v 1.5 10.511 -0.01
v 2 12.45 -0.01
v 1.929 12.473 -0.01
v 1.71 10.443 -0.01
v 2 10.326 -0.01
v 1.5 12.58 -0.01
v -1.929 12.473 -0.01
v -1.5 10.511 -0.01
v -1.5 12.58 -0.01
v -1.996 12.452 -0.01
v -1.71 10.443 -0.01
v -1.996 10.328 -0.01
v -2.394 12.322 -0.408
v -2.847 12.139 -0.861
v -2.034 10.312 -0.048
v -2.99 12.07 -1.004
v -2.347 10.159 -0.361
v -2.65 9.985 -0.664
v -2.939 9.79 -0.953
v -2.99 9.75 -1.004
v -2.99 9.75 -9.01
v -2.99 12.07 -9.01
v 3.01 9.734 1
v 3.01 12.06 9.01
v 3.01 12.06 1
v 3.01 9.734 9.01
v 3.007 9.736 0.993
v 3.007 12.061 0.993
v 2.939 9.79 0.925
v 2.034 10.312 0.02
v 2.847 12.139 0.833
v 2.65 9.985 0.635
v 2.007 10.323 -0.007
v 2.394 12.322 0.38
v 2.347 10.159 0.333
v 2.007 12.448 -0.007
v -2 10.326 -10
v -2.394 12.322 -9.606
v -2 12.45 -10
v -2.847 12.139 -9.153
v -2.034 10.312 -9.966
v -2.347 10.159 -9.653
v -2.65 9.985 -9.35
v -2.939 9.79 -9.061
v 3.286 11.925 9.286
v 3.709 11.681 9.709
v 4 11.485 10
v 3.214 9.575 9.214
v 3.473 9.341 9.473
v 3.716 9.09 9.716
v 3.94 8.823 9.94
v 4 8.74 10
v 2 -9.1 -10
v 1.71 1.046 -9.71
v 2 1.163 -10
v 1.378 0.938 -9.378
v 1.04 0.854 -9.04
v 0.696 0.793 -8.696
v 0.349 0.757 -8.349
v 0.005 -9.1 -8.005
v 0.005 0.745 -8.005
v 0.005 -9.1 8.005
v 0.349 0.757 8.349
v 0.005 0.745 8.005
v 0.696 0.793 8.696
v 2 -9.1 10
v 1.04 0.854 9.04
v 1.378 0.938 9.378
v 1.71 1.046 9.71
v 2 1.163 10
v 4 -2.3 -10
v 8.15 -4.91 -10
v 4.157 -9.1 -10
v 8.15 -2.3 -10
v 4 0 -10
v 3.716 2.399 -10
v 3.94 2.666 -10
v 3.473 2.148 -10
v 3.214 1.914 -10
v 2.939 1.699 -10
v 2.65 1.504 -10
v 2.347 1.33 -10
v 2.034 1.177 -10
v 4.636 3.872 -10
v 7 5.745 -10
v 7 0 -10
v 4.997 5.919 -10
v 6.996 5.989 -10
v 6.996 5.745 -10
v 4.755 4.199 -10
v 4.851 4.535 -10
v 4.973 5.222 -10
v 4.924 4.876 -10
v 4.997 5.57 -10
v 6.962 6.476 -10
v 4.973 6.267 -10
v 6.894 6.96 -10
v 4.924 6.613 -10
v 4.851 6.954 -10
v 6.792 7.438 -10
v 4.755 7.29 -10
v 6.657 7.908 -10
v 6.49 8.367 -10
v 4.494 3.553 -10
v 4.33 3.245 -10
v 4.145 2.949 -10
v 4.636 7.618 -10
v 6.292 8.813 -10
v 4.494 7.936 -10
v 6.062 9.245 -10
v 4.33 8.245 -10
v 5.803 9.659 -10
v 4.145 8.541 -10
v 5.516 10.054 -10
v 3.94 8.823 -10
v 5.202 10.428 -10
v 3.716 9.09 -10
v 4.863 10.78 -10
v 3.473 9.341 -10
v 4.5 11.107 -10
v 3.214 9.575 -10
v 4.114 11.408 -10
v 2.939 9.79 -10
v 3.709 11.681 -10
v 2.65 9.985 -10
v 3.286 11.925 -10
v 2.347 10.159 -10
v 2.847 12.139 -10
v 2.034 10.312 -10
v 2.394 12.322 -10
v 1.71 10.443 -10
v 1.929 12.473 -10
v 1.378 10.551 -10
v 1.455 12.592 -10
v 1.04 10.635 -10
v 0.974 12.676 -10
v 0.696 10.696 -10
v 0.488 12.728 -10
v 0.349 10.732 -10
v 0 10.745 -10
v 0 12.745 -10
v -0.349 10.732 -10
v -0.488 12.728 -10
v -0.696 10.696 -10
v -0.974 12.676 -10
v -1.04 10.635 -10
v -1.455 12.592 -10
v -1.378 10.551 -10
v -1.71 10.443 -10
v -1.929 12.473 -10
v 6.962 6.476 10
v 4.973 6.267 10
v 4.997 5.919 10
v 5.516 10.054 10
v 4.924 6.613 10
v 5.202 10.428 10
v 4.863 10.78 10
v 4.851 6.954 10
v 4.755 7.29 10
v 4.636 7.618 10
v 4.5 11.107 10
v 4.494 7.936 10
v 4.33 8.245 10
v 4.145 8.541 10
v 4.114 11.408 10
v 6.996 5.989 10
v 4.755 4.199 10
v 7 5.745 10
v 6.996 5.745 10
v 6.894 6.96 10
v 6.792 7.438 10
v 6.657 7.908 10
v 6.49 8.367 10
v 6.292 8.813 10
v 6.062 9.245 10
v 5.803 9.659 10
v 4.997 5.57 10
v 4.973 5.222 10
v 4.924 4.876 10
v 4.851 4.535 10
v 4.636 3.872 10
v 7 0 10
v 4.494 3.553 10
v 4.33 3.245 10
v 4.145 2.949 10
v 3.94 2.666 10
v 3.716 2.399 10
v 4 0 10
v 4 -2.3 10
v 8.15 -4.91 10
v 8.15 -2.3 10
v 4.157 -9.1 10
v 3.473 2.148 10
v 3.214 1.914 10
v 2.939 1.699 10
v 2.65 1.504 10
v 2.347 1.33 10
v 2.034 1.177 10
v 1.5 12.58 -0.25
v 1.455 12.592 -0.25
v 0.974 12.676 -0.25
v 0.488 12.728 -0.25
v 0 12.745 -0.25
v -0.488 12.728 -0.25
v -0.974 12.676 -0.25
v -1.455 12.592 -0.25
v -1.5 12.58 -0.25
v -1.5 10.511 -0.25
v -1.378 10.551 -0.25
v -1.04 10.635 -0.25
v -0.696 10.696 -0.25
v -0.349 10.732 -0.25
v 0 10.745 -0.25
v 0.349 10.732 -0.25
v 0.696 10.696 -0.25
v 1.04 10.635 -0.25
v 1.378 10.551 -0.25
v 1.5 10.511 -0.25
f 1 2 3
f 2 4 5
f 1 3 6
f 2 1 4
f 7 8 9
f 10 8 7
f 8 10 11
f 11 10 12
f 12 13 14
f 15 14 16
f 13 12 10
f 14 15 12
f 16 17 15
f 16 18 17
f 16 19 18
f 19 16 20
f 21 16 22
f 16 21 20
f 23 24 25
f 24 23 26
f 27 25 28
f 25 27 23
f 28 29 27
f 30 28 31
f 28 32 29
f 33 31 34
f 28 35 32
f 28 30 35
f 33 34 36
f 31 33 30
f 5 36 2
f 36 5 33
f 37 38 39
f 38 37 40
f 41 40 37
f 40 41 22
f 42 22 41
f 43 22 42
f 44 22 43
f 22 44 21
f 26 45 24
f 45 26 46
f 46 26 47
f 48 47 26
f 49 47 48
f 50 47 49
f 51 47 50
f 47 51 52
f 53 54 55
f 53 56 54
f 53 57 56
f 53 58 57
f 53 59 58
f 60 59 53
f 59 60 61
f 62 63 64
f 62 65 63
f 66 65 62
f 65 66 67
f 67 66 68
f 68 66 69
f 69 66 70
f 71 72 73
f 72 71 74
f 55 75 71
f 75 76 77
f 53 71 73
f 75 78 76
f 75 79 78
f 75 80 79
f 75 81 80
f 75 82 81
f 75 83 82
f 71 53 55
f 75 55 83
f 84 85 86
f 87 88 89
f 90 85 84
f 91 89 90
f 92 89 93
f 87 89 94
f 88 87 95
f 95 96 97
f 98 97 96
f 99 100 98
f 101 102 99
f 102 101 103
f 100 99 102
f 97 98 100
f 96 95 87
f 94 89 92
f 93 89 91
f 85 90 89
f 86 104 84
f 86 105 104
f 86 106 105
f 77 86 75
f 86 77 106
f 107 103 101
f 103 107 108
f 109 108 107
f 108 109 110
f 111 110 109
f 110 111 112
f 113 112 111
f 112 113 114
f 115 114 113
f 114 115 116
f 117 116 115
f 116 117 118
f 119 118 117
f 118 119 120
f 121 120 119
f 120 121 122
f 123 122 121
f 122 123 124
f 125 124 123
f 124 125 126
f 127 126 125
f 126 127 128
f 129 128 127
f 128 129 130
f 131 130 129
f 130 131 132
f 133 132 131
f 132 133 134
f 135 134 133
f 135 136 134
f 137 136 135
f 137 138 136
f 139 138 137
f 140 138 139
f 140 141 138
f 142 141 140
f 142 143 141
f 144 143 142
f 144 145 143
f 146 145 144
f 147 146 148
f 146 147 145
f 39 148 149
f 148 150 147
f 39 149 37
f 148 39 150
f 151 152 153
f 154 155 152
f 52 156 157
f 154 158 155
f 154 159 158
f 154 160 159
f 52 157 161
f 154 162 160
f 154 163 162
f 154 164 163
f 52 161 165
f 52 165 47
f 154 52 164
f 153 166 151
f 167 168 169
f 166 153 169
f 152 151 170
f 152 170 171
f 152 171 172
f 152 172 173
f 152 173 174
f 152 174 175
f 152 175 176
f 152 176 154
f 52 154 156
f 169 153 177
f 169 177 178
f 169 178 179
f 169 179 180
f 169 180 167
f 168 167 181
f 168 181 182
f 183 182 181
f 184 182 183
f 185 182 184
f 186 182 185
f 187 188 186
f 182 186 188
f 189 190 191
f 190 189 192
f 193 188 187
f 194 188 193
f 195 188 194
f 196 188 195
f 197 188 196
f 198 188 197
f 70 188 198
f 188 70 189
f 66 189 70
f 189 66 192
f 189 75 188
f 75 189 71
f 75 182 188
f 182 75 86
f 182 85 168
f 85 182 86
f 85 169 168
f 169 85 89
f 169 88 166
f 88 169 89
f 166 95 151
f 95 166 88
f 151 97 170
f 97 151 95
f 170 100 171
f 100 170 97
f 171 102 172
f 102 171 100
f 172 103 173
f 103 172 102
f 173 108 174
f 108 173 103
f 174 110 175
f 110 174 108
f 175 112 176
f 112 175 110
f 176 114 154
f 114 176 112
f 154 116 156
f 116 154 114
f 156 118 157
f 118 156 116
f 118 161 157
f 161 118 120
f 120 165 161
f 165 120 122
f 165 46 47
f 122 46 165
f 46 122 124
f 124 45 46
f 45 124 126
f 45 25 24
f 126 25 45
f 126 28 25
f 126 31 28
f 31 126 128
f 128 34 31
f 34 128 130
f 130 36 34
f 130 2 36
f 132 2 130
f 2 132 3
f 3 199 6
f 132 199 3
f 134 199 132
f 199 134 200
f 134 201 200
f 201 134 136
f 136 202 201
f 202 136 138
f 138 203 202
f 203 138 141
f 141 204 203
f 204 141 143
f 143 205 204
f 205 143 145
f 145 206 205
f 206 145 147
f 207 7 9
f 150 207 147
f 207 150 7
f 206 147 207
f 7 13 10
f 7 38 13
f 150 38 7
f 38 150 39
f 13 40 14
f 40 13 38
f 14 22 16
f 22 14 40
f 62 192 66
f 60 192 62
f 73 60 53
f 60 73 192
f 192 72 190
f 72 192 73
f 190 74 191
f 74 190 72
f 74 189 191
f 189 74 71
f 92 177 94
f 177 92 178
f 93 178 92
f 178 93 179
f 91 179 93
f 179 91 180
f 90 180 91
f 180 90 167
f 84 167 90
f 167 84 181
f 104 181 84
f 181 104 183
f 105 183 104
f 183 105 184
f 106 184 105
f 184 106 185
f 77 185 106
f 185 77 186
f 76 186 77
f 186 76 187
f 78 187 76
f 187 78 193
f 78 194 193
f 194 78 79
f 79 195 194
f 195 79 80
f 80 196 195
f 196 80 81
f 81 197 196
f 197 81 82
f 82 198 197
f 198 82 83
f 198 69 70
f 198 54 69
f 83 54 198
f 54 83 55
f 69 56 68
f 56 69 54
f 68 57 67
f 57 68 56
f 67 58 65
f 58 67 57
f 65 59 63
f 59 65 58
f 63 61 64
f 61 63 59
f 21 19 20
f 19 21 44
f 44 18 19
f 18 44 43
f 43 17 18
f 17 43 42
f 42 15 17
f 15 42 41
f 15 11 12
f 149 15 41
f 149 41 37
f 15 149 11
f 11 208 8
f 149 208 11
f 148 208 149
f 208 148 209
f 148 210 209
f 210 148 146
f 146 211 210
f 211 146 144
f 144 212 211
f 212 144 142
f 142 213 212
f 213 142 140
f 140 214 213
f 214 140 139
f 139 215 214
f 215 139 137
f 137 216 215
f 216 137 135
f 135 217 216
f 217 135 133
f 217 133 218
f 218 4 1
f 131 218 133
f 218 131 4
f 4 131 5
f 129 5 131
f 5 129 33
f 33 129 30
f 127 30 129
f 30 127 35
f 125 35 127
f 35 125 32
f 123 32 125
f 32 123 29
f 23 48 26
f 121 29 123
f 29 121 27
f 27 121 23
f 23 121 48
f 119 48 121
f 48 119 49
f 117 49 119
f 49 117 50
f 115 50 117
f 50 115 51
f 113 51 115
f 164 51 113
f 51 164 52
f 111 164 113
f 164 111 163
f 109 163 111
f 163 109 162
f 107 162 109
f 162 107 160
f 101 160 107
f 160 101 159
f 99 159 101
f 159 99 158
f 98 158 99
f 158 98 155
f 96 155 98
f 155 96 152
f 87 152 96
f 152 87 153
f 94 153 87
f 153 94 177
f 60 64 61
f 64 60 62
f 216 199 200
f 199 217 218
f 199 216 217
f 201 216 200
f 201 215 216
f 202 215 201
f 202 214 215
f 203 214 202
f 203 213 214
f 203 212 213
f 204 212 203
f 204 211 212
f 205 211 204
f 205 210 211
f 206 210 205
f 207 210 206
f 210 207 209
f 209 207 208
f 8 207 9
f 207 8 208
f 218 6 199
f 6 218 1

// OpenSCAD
// System30 T-Slot Cable Holder
// v1, 26/3/2019
// by inks007
// This work is licensed under a Creative Commons Attribution-NonCommercial-ShareAlike 4.0 International License
// (CC BY-NC-SA 4.0)

// Cable holder length
holder_ln = 20;
// Cable holder inner diameter (range = 5-36)
holder_id = 10; // [5:36]
// Cable holder thickness (range = 2-4)
holder_th = 2; // [2:0.25:4]
// Loosen fit (range = 0-0.3)
loosen = 0.1; // [0:0.05:0.31]

/* [Hidden] */
holder_hln = holder_ln/2;
holder_ir = holder_id/2;
holder_od = holder_id+holder_th*2;
holder_or = holder_ir+holder_th;
holder_os = sqrt(pow(holder_ir+holder_th,2)-16)-holder_ir;
cut_os = 0.6*holder_ir;
cut_points = [[0,0],[0,cut_os-1],[1,cut_os],[holder_hln+0.1,cut_os]];

rotate([-90,90,0]) holder();

module holder() {
	difference() {
		rotate([0,-90,0]) linear_extrude(holder_ln,convexity=3,center=true) difference() {
			union() {
				offset(delta=-loosen) flange_profile();
				intersection() {
					translate([holder_ir+holder_os,0]) circle(d=holder_od,$fn=90);
					translate([holder_id+holder_os,0]) square(holder_od+2,center=true);
				}
				translate([holder_ir/2+holder_os/2,0]) square([holder_ir+holder_os,holder_od],center=true);
			}
			translate([holder_ir+holder_os,0]) circle(d=holder_id,$fn=90);
		}
		// Base cut
		translate([0,0,-10]) linear_extrude(10.1+holder_os+holder_ir,convexity=2) square([holder_ln+2,0.01],center=true);
		// Z cut
		rotate_duplicate([0,0,1]) translate([0,0,holder_os+holder_ir]) linear_extrude(holder_or+1,convexity=2) for (p=[0:1:len(cut_points)-2]) hull() {
			translate(cut_points[p]) circle(r=0.01,$fn=8);
			translate(cut_points[p+1]) circle(r=0.01,$fn=8);
		}
		// Screwdriver slot
		translate([0,0,holder_os+holder_ir+holder_or/2+0.5]) cube([0.5,cut_os*2-3,holder_or+1],center=true);
		// Slide on chamfers
		rotate_duplicate([0,0,1]) translate([holder_hln,cut_os,holder_os+holder_ir]) cylinder(r=1,h=holder_or+1,$fn=4);
		rotate_duplicate([0,0,1]) translate([holder_hln,0,-10]) cylinder(r=2,h=10.1+holder_os+holder_ir,$fn=4);
//		rotate_duplicate([0,0,1]) translate([holder_hln,0,-10]) linear_extrude(10.1+holder_os+holder_ir,convexity=2) polygon([[1,2],[0,2],[-2,0],[-1,0],[0,-1],[1,-1]]);
		// Remove half
		translate([0,(holder_id+holder_th)/2+1,-10]) linear_extrude(10.1+holder_os+holder_ir,convexity=2) square([holder_ln+2,holder_id+holder_th+2],center=true);
		translate([0,0,holder_os+holder_ir]) linear_extrude(holder_or+1,convexity=2) for (p=[0:1:len(cut_points)-2]) hull() {
			translate(cut_points[p]) rotate(90) square(holder_id+holder_th);
			translate(cut_points[p+1]) rotate(90) square(holder_id+holder_th);
		}
		rotate(180) translate([0,0,holder_os+holder_ir]) linear_extrude(holder_or+1,convexity=2) for (p=[0:1:len(cut_points)-2]) hull() {
			translate(cut_points[p]) rotate(-90) square(holder_id+holder_th);
			translate(cut_points[p+1]) rotate(-90) square(holder_id+holder_th);
		}
	}
}

module flange_profile() {
	polygon([[2,-4.1],[-2.2,-4.1],[-2.2,-8.25],[-9.2+4.25,-8.25],[-9.2,-4.2],[-9.2,4.2],[-9.2+4.25,8.25],[-2.2,8.25],[-2.2,4.1],[2,4.1]]);
}

module mirror_duplicate(axis) {
	x = axis[0] ? [0,1] : [0];
	y = axis[1] ? [0,1] : [0];
	z = axis[2] ? [0,1] : [0];
	for (a=x) mirror([a,0,0]) for (b=y) mirror([0,b,0]) for (c=z) mirror([0,0,c]) children();
}

module rotate_duplicate(v,n=2) {
	step = 360/n;
	for (a=[0:step:359]) rotate(a=a,v=v) children();
}
